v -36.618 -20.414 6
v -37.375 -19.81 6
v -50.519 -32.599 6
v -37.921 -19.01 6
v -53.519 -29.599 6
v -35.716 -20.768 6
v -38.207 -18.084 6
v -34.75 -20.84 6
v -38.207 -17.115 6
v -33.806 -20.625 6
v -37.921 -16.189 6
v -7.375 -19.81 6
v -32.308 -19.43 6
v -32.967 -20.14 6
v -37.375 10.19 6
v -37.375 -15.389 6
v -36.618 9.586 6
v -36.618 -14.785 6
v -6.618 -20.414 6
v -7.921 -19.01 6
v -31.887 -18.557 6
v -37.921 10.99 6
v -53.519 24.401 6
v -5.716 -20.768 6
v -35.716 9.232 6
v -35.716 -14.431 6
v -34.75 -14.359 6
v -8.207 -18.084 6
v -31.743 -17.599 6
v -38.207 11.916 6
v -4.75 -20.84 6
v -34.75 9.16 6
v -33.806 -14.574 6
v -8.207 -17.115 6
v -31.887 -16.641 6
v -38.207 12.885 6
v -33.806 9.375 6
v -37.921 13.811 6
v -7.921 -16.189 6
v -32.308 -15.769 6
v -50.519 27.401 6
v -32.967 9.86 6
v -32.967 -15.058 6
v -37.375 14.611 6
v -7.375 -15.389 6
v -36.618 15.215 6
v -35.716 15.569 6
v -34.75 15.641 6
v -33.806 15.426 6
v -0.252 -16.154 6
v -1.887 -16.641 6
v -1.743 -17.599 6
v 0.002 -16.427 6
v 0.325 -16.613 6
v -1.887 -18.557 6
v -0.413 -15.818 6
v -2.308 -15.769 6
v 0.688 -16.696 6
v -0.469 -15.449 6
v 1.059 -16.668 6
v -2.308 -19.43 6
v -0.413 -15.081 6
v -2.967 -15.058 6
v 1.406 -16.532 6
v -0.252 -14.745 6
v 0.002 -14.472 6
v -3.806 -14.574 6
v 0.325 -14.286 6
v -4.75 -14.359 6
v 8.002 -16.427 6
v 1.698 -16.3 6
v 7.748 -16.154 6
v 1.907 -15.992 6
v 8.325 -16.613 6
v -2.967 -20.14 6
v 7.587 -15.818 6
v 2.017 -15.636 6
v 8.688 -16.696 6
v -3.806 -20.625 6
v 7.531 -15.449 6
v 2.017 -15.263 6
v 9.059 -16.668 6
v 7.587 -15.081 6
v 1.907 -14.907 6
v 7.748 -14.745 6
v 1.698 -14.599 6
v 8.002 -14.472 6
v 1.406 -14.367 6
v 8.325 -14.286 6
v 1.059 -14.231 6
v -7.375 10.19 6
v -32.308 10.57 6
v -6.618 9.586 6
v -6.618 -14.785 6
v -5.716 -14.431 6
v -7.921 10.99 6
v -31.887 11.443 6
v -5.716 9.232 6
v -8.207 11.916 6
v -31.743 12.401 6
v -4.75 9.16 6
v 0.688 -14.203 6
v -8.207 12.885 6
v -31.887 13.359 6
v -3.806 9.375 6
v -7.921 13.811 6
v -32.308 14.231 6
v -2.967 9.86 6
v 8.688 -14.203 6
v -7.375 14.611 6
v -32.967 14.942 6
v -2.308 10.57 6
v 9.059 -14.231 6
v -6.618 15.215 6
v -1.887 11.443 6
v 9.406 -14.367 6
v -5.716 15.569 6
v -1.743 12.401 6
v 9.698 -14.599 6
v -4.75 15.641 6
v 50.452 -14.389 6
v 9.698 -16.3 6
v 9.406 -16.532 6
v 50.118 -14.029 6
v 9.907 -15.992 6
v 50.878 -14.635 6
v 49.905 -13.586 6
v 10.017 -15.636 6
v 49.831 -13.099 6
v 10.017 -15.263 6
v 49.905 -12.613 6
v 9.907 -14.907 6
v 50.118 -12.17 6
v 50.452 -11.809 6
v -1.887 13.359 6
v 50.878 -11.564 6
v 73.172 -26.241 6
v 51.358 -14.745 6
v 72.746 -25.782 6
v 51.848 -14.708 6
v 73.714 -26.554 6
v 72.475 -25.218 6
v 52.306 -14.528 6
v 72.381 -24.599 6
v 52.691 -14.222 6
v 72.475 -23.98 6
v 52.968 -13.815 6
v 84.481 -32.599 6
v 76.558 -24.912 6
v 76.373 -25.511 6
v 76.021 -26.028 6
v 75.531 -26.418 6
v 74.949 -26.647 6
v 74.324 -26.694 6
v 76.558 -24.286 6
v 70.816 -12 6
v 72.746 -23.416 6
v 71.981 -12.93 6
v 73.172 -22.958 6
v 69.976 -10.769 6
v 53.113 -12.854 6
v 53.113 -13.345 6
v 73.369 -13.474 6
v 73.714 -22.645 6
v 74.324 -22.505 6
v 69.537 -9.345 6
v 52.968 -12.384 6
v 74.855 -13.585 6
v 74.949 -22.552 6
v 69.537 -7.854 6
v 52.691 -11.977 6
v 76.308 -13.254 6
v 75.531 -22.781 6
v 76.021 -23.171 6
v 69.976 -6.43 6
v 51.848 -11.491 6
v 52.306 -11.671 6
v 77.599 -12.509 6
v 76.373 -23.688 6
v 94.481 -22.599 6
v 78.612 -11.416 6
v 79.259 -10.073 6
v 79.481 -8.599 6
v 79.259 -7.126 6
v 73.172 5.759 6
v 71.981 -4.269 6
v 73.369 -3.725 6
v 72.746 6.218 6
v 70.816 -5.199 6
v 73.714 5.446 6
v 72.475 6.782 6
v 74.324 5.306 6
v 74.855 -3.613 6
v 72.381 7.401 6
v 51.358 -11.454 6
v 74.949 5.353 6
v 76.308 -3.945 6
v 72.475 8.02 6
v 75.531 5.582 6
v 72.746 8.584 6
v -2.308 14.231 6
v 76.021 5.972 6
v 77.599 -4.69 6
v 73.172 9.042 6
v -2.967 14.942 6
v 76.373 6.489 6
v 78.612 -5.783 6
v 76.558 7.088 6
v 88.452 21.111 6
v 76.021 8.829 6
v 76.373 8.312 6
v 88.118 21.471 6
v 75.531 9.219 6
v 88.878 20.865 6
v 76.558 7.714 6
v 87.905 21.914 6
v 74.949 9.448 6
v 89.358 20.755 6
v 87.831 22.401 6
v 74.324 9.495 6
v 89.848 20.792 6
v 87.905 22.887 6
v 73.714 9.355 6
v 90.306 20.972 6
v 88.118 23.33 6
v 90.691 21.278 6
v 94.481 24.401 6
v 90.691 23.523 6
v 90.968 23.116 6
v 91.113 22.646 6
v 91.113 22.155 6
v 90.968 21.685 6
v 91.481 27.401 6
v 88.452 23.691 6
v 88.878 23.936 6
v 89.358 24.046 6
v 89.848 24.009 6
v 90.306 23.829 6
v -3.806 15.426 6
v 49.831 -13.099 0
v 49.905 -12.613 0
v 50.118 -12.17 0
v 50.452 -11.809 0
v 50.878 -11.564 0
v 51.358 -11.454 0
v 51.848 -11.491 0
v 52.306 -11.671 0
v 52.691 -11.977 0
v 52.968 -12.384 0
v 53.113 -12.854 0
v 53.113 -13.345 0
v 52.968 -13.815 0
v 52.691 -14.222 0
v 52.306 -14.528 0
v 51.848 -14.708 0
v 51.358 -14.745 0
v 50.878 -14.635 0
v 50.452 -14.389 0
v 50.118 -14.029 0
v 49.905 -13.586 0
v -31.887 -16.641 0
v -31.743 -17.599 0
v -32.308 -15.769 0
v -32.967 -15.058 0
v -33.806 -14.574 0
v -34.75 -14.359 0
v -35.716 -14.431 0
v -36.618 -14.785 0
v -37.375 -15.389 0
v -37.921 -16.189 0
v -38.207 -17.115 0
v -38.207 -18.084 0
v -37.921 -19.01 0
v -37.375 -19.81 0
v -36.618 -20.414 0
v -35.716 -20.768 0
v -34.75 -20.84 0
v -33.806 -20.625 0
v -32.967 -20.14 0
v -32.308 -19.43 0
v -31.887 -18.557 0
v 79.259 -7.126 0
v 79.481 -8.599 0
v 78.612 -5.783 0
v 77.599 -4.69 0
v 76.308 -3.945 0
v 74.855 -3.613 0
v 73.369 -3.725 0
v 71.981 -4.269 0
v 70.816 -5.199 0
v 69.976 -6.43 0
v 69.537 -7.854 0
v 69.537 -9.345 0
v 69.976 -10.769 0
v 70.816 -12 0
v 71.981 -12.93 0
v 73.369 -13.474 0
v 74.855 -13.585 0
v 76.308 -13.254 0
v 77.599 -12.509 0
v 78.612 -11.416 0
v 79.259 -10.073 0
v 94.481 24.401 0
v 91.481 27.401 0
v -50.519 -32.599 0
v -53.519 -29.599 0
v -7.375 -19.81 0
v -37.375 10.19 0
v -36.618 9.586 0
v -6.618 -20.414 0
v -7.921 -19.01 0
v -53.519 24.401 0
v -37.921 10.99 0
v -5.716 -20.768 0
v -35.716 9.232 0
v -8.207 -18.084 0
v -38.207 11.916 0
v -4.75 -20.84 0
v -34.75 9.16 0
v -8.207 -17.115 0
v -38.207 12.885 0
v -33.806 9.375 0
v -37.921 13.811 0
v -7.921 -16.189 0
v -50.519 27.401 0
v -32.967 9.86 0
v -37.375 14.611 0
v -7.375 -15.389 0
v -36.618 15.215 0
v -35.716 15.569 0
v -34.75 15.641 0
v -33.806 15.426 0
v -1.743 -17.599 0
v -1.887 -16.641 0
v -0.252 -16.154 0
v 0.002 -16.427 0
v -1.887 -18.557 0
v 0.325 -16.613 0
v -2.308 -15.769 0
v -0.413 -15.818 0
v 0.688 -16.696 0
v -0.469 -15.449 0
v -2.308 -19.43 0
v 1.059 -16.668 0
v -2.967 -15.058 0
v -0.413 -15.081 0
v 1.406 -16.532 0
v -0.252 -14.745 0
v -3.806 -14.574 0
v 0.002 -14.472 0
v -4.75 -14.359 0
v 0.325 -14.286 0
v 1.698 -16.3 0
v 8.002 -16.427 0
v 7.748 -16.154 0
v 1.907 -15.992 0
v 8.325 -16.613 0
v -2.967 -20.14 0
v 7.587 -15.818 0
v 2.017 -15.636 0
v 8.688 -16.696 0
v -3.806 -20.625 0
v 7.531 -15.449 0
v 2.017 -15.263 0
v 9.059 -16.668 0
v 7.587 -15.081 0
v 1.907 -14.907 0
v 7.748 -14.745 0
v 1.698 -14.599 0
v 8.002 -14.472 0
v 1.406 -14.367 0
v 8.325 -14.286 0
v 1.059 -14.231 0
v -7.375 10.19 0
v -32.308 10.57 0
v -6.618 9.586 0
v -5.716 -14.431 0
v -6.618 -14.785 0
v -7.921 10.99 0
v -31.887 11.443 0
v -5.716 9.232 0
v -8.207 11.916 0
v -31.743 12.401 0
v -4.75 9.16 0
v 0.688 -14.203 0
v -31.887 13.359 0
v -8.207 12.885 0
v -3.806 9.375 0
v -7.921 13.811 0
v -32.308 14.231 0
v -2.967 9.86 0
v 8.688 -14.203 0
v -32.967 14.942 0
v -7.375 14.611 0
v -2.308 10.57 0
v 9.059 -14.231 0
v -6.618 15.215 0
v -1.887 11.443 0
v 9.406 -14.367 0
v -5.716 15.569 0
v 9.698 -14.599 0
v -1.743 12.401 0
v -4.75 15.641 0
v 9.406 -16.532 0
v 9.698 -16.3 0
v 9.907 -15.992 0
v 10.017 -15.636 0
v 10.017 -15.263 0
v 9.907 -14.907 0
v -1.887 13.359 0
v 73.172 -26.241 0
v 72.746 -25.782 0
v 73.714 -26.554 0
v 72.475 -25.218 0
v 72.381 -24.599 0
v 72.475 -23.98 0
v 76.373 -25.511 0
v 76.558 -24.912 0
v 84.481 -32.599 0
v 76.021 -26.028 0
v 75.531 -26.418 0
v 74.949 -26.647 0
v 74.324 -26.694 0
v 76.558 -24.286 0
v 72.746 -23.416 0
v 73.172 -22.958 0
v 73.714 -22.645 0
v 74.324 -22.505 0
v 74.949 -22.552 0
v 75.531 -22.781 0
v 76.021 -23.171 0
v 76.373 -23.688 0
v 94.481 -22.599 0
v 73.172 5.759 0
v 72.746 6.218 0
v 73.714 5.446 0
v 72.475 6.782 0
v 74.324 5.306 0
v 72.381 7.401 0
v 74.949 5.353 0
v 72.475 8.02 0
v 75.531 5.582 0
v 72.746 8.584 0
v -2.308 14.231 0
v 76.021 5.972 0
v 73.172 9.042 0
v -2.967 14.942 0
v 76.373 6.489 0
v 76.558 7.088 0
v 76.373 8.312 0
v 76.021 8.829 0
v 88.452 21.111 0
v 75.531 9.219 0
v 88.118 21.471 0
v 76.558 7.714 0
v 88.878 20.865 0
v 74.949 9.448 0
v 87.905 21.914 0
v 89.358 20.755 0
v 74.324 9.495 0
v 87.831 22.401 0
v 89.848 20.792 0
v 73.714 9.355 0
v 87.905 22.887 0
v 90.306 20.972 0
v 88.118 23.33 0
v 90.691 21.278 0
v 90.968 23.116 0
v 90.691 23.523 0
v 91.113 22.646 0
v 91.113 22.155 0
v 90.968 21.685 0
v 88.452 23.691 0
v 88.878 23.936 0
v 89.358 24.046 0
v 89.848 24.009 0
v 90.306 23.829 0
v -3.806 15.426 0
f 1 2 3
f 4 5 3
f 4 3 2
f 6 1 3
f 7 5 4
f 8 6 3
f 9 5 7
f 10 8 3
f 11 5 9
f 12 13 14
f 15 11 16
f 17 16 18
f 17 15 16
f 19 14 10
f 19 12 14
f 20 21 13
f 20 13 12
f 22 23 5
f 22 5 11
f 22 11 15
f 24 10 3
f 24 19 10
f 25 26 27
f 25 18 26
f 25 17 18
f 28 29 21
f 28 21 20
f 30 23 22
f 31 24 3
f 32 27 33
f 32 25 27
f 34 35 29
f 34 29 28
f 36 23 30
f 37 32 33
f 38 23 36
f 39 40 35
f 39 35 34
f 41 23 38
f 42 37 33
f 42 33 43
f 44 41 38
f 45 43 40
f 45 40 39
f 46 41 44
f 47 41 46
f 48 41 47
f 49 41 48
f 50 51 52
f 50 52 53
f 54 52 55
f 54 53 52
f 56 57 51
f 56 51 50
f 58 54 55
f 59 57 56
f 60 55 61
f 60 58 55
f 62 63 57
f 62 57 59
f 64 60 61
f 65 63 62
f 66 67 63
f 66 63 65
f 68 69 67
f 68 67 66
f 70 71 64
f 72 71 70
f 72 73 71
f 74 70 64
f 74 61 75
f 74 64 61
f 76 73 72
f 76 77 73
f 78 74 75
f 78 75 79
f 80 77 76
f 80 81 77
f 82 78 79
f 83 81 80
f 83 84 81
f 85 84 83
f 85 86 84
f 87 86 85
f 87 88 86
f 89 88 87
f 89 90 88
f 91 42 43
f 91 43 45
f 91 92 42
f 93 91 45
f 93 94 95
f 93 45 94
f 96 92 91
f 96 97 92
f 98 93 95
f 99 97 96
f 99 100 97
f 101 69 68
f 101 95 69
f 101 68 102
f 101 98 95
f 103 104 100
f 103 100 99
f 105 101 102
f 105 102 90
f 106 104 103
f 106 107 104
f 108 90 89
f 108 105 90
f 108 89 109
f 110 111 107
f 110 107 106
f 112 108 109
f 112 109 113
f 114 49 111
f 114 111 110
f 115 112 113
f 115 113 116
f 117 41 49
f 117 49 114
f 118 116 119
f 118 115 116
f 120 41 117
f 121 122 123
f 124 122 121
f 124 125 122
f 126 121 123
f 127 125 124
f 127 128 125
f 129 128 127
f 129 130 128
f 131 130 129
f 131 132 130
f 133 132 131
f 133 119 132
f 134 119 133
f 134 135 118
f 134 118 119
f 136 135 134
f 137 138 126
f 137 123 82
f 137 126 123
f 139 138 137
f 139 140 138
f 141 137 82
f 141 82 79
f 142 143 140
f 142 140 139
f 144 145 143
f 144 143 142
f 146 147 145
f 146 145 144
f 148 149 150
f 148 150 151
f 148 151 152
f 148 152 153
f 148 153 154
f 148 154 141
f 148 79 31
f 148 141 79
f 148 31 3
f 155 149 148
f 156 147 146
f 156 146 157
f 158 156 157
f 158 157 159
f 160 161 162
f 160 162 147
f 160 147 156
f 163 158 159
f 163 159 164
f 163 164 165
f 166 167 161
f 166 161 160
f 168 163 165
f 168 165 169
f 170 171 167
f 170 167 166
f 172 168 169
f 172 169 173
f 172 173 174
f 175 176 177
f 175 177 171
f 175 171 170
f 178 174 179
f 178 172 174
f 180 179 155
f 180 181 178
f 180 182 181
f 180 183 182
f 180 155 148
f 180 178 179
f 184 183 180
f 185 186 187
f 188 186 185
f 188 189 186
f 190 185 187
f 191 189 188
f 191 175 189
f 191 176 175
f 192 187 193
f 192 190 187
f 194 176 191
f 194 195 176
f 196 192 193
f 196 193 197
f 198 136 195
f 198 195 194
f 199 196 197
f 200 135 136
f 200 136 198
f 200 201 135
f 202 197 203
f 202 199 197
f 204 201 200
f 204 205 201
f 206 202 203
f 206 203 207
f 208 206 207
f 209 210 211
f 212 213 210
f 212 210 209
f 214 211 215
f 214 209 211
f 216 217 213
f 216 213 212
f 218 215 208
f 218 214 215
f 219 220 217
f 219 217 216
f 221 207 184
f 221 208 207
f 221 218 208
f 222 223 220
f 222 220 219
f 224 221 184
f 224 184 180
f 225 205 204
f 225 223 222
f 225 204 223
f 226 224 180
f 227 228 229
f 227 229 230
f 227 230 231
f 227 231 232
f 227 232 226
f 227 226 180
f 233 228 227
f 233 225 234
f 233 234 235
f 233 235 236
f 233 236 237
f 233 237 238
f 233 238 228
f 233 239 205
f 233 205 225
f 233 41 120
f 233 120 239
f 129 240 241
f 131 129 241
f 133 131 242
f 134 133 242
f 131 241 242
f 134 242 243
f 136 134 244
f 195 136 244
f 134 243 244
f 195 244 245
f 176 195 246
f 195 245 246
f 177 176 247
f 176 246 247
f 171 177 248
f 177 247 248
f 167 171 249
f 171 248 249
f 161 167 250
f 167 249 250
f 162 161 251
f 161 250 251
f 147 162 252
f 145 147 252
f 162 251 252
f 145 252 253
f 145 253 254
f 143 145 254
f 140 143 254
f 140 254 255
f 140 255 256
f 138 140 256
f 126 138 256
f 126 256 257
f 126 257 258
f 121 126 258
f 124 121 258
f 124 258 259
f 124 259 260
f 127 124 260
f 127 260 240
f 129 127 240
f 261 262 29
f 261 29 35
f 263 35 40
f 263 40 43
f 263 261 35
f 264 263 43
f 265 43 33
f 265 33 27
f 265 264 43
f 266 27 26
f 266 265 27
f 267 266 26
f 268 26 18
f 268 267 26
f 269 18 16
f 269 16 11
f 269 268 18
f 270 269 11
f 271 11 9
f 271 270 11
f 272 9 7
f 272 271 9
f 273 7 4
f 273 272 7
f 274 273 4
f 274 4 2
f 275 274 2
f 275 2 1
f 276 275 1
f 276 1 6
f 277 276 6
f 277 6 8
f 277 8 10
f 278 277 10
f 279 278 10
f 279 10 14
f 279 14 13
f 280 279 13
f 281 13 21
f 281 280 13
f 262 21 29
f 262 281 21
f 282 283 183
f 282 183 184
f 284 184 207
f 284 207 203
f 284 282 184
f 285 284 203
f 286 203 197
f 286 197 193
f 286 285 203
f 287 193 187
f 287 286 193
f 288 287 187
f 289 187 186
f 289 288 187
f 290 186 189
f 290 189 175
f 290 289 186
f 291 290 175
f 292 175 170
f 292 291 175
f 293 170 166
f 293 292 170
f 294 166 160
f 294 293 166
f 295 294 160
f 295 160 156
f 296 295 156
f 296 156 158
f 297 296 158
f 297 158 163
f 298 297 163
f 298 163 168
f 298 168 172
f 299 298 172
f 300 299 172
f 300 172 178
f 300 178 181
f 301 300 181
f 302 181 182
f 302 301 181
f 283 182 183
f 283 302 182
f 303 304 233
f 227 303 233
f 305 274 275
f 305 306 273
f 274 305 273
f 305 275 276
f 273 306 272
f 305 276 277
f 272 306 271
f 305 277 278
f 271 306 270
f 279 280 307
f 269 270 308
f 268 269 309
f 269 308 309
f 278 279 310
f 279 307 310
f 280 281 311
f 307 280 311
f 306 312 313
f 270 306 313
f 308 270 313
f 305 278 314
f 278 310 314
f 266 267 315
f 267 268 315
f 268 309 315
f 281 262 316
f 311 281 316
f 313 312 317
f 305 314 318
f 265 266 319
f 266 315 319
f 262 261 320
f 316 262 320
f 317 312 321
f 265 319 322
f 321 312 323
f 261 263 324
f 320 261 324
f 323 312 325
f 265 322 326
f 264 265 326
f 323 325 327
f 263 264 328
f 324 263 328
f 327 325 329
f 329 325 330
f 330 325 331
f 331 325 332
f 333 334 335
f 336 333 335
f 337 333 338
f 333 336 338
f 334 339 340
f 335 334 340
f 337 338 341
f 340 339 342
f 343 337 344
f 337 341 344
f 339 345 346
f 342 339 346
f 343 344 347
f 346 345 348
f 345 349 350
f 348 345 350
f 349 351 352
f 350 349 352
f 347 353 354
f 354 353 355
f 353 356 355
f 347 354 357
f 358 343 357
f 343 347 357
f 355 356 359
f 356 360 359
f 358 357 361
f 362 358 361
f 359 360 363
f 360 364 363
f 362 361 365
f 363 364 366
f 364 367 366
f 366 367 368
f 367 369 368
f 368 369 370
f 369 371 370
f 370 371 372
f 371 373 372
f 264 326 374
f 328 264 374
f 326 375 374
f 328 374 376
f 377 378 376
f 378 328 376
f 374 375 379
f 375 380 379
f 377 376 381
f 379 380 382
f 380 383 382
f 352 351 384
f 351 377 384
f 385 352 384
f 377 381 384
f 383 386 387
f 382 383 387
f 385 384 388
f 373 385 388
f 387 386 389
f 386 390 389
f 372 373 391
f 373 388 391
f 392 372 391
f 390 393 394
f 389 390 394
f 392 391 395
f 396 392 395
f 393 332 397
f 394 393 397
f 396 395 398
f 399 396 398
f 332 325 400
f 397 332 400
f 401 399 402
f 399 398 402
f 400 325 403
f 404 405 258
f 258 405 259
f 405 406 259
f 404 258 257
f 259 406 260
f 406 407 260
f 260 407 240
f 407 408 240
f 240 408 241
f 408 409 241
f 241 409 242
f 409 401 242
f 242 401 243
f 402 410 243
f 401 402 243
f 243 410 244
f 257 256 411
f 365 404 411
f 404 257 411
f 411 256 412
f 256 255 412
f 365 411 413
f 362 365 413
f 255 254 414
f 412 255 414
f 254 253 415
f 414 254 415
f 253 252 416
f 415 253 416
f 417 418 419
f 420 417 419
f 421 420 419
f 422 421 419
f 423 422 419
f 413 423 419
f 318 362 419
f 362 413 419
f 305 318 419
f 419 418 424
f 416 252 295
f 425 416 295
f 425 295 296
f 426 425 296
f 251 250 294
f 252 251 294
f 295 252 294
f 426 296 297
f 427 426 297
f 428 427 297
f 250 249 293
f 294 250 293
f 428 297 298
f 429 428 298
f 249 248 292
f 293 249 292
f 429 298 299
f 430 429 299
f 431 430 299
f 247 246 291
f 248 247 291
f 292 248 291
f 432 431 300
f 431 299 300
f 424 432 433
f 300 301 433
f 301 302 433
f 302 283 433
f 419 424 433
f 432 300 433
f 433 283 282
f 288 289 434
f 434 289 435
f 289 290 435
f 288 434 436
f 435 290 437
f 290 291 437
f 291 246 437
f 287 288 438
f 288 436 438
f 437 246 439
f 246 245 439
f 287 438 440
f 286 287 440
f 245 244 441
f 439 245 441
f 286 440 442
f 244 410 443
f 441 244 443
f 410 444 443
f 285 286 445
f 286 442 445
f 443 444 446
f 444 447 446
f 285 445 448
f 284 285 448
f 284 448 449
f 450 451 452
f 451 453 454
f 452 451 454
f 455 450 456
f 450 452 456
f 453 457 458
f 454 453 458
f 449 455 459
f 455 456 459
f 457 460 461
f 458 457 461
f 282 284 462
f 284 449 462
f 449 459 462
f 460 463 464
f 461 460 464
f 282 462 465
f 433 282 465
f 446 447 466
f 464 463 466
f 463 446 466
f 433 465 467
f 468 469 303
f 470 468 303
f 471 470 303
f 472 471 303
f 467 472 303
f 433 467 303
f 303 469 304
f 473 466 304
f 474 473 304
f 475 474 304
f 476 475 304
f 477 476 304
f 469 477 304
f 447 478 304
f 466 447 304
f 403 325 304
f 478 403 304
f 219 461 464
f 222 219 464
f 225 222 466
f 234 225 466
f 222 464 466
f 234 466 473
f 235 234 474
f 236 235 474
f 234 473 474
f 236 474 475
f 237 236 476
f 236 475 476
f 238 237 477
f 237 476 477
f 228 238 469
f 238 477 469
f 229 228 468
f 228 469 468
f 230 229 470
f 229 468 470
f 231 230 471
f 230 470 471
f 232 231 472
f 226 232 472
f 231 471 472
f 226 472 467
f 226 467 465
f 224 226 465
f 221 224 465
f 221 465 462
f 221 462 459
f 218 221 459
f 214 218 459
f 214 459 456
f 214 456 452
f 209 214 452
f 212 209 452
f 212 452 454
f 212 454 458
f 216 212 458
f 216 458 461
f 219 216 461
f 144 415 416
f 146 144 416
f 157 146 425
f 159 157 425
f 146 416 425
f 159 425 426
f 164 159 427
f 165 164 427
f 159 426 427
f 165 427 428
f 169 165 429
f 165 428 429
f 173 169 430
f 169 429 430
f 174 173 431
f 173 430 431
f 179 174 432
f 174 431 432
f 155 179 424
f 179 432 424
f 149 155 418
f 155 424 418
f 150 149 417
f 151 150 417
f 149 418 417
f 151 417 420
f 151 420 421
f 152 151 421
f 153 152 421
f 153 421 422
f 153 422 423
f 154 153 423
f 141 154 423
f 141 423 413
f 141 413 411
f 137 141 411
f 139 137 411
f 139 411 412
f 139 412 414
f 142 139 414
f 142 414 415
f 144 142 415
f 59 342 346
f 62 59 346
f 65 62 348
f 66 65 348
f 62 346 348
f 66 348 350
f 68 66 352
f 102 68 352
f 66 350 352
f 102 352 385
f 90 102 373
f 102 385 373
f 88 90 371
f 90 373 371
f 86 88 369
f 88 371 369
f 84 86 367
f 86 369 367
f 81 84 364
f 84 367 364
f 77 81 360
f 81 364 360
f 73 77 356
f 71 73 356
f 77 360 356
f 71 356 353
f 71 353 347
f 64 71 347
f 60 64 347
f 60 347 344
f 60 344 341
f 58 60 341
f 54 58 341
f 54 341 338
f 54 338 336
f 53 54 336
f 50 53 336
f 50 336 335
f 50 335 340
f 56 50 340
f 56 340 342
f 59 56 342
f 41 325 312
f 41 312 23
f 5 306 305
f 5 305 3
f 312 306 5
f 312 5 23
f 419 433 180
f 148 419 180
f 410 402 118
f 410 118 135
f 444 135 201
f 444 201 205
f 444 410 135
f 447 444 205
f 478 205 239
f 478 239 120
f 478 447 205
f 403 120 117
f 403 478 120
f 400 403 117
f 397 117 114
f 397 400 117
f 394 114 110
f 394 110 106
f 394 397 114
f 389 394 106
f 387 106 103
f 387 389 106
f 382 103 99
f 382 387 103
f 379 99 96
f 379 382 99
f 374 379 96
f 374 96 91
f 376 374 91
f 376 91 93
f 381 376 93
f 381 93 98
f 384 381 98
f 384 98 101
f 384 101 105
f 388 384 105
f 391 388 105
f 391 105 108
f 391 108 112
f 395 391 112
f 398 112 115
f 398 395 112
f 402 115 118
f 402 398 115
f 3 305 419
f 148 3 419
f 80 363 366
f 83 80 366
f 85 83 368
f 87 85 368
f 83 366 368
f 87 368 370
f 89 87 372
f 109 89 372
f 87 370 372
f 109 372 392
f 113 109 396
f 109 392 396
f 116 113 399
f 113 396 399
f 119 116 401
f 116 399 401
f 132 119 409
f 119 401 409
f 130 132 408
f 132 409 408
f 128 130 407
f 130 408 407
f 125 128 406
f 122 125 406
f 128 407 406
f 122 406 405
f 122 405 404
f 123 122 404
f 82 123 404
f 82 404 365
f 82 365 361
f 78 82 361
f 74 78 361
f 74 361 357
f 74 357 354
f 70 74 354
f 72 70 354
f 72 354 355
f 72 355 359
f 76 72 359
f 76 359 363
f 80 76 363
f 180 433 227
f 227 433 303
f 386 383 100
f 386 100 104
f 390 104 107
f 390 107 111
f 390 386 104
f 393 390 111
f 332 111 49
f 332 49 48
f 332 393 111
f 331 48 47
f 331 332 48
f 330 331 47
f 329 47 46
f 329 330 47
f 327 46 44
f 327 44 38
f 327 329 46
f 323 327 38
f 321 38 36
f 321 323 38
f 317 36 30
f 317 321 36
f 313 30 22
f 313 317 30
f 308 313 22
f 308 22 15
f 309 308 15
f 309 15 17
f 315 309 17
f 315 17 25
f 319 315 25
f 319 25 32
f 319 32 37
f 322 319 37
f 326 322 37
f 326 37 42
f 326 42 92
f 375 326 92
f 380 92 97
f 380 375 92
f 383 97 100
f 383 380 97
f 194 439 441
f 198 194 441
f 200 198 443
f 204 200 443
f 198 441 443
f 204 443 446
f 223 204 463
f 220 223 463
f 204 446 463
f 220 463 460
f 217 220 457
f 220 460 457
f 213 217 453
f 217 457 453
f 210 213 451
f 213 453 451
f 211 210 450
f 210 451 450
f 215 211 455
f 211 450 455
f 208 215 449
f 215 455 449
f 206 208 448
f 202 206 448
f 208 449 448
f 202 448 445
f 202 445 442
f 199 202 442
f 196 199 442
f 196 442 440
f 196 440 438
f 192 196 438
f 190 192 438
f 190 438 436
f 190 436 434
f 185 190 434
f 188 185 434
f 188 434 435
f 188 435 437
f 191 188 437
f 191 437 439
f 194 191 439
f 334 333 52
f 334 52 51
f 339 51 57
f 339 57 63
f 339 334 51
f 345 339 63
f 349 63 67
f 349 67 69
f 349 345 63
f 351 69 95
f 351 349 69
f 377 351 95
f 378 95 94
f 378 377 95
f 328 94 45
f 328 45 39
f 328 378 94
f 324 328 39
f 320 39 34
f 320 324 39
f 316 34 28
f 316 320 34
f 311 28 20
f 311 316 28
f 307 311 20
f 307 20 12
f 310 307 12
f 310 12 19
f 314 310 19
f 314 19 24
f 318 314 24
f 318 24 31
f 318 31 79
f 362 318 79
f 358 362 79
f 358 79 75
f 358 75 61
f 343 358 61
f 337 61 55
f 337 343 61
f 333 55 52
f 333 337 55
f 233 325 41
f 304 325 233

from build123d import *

# Parameters (mm, degrees)
SKETCH1_W             = 148
SKETCH1_H             = 60
SKETCH1_R             = 3.25
SKETCH1_R_2           = 5
BOSS_EXTRUDE1_DEPTH   = 6
M5X0_8_TAPPED_HOLE1_D = 4.2
M4X0_7_TAPPED_HOLE1_D = 3.3
M3X0_5_TAPPED_HOLE1_D = 2.5
CHAMFER1_SIZE         = 10
CHAMFER2_SIZE         = 3


with BuildPart() as part:
    # Sketch1 → Boss-Extrude1 (new body)
    with BuildSketch(Plane.XY):
        with Locations((20.481223922, -2.599443672)):
            Rectangle(SKETCH1_W, SKETCH1_H)
        with Locations((-34.993045897, 12.400556328)):
            Circle(SKETCH1_R, mode=Mode.SUBTRACT)
        with Locations((-4.993045897, 12.400556328)):
            Circle(SKETCH1_R, mode=Mode.SUBTRACT)
        with Locations((-34.993045897, -17.599443672)):
            Circle(SKETCH1_R, mode=Mode.SUBTRACT)
        with Locations((-4.993045897, -17.599443672)):
            Circle(SKETCH1_R, mode=Mode.SUBTRACT)
        with Locations((74.481223922, -8.599443672)):
            Circle(SKETCH1_R_2, mode=Mode.SUBTRACT)
    extrude(amount=BOSS_EXTRUDE1_DEPTH)

    # M5x0.8 Tapped Hole1 (through all)
    with Locations(Plane.XY.offset(6)):
        with Locations((74.481223922, 7.400556328), (74.481223922, -24.599443672)):
            Hole(M5X0_8_TAPPED_HOLE1_D / 2)

    # M4x0.7 Tapped Hole1 (through all)
    with Locations(Plane.XY.offset(6)):
        with Locations((89.481223922, 22.400556328), (51.481223922, -13.099443672)):
            Hole(M4X0_7_TAPPED_HOLE1_D / 2)

    # M3x0.5 Tapped Hole1 (through all)
    with Locations(Plane.XY.offset(6)):
        with Locations((0.781223922, -15.449443672), (8.781223922, -15.449443672)):
            Hole(M3X0_5_TAPPED_HOLE1_D / 2)

    # Chamfer1
    chamfer1_edges = [part.edges().sort_by_distance(p)[0] for p in [
        (94.481223922, -32.599443672, 3),
    ]]
    chamfer(chamfer1_edges, length=CHAMFER1_SIZE)

    # Chamfer2
    chamfer2_edges = [part.edges().sort_by_distance(p)[0] for p in [
        (-53.518776078, 27.400556328, 3),
        (94.481223922, 27.400556328, 3),
        (-53.518776078, -32.599443672, 3),
    ]]
    chamfer(chamfer2_edges, length=CHAMFER2_SIZE)


solid = part.part
